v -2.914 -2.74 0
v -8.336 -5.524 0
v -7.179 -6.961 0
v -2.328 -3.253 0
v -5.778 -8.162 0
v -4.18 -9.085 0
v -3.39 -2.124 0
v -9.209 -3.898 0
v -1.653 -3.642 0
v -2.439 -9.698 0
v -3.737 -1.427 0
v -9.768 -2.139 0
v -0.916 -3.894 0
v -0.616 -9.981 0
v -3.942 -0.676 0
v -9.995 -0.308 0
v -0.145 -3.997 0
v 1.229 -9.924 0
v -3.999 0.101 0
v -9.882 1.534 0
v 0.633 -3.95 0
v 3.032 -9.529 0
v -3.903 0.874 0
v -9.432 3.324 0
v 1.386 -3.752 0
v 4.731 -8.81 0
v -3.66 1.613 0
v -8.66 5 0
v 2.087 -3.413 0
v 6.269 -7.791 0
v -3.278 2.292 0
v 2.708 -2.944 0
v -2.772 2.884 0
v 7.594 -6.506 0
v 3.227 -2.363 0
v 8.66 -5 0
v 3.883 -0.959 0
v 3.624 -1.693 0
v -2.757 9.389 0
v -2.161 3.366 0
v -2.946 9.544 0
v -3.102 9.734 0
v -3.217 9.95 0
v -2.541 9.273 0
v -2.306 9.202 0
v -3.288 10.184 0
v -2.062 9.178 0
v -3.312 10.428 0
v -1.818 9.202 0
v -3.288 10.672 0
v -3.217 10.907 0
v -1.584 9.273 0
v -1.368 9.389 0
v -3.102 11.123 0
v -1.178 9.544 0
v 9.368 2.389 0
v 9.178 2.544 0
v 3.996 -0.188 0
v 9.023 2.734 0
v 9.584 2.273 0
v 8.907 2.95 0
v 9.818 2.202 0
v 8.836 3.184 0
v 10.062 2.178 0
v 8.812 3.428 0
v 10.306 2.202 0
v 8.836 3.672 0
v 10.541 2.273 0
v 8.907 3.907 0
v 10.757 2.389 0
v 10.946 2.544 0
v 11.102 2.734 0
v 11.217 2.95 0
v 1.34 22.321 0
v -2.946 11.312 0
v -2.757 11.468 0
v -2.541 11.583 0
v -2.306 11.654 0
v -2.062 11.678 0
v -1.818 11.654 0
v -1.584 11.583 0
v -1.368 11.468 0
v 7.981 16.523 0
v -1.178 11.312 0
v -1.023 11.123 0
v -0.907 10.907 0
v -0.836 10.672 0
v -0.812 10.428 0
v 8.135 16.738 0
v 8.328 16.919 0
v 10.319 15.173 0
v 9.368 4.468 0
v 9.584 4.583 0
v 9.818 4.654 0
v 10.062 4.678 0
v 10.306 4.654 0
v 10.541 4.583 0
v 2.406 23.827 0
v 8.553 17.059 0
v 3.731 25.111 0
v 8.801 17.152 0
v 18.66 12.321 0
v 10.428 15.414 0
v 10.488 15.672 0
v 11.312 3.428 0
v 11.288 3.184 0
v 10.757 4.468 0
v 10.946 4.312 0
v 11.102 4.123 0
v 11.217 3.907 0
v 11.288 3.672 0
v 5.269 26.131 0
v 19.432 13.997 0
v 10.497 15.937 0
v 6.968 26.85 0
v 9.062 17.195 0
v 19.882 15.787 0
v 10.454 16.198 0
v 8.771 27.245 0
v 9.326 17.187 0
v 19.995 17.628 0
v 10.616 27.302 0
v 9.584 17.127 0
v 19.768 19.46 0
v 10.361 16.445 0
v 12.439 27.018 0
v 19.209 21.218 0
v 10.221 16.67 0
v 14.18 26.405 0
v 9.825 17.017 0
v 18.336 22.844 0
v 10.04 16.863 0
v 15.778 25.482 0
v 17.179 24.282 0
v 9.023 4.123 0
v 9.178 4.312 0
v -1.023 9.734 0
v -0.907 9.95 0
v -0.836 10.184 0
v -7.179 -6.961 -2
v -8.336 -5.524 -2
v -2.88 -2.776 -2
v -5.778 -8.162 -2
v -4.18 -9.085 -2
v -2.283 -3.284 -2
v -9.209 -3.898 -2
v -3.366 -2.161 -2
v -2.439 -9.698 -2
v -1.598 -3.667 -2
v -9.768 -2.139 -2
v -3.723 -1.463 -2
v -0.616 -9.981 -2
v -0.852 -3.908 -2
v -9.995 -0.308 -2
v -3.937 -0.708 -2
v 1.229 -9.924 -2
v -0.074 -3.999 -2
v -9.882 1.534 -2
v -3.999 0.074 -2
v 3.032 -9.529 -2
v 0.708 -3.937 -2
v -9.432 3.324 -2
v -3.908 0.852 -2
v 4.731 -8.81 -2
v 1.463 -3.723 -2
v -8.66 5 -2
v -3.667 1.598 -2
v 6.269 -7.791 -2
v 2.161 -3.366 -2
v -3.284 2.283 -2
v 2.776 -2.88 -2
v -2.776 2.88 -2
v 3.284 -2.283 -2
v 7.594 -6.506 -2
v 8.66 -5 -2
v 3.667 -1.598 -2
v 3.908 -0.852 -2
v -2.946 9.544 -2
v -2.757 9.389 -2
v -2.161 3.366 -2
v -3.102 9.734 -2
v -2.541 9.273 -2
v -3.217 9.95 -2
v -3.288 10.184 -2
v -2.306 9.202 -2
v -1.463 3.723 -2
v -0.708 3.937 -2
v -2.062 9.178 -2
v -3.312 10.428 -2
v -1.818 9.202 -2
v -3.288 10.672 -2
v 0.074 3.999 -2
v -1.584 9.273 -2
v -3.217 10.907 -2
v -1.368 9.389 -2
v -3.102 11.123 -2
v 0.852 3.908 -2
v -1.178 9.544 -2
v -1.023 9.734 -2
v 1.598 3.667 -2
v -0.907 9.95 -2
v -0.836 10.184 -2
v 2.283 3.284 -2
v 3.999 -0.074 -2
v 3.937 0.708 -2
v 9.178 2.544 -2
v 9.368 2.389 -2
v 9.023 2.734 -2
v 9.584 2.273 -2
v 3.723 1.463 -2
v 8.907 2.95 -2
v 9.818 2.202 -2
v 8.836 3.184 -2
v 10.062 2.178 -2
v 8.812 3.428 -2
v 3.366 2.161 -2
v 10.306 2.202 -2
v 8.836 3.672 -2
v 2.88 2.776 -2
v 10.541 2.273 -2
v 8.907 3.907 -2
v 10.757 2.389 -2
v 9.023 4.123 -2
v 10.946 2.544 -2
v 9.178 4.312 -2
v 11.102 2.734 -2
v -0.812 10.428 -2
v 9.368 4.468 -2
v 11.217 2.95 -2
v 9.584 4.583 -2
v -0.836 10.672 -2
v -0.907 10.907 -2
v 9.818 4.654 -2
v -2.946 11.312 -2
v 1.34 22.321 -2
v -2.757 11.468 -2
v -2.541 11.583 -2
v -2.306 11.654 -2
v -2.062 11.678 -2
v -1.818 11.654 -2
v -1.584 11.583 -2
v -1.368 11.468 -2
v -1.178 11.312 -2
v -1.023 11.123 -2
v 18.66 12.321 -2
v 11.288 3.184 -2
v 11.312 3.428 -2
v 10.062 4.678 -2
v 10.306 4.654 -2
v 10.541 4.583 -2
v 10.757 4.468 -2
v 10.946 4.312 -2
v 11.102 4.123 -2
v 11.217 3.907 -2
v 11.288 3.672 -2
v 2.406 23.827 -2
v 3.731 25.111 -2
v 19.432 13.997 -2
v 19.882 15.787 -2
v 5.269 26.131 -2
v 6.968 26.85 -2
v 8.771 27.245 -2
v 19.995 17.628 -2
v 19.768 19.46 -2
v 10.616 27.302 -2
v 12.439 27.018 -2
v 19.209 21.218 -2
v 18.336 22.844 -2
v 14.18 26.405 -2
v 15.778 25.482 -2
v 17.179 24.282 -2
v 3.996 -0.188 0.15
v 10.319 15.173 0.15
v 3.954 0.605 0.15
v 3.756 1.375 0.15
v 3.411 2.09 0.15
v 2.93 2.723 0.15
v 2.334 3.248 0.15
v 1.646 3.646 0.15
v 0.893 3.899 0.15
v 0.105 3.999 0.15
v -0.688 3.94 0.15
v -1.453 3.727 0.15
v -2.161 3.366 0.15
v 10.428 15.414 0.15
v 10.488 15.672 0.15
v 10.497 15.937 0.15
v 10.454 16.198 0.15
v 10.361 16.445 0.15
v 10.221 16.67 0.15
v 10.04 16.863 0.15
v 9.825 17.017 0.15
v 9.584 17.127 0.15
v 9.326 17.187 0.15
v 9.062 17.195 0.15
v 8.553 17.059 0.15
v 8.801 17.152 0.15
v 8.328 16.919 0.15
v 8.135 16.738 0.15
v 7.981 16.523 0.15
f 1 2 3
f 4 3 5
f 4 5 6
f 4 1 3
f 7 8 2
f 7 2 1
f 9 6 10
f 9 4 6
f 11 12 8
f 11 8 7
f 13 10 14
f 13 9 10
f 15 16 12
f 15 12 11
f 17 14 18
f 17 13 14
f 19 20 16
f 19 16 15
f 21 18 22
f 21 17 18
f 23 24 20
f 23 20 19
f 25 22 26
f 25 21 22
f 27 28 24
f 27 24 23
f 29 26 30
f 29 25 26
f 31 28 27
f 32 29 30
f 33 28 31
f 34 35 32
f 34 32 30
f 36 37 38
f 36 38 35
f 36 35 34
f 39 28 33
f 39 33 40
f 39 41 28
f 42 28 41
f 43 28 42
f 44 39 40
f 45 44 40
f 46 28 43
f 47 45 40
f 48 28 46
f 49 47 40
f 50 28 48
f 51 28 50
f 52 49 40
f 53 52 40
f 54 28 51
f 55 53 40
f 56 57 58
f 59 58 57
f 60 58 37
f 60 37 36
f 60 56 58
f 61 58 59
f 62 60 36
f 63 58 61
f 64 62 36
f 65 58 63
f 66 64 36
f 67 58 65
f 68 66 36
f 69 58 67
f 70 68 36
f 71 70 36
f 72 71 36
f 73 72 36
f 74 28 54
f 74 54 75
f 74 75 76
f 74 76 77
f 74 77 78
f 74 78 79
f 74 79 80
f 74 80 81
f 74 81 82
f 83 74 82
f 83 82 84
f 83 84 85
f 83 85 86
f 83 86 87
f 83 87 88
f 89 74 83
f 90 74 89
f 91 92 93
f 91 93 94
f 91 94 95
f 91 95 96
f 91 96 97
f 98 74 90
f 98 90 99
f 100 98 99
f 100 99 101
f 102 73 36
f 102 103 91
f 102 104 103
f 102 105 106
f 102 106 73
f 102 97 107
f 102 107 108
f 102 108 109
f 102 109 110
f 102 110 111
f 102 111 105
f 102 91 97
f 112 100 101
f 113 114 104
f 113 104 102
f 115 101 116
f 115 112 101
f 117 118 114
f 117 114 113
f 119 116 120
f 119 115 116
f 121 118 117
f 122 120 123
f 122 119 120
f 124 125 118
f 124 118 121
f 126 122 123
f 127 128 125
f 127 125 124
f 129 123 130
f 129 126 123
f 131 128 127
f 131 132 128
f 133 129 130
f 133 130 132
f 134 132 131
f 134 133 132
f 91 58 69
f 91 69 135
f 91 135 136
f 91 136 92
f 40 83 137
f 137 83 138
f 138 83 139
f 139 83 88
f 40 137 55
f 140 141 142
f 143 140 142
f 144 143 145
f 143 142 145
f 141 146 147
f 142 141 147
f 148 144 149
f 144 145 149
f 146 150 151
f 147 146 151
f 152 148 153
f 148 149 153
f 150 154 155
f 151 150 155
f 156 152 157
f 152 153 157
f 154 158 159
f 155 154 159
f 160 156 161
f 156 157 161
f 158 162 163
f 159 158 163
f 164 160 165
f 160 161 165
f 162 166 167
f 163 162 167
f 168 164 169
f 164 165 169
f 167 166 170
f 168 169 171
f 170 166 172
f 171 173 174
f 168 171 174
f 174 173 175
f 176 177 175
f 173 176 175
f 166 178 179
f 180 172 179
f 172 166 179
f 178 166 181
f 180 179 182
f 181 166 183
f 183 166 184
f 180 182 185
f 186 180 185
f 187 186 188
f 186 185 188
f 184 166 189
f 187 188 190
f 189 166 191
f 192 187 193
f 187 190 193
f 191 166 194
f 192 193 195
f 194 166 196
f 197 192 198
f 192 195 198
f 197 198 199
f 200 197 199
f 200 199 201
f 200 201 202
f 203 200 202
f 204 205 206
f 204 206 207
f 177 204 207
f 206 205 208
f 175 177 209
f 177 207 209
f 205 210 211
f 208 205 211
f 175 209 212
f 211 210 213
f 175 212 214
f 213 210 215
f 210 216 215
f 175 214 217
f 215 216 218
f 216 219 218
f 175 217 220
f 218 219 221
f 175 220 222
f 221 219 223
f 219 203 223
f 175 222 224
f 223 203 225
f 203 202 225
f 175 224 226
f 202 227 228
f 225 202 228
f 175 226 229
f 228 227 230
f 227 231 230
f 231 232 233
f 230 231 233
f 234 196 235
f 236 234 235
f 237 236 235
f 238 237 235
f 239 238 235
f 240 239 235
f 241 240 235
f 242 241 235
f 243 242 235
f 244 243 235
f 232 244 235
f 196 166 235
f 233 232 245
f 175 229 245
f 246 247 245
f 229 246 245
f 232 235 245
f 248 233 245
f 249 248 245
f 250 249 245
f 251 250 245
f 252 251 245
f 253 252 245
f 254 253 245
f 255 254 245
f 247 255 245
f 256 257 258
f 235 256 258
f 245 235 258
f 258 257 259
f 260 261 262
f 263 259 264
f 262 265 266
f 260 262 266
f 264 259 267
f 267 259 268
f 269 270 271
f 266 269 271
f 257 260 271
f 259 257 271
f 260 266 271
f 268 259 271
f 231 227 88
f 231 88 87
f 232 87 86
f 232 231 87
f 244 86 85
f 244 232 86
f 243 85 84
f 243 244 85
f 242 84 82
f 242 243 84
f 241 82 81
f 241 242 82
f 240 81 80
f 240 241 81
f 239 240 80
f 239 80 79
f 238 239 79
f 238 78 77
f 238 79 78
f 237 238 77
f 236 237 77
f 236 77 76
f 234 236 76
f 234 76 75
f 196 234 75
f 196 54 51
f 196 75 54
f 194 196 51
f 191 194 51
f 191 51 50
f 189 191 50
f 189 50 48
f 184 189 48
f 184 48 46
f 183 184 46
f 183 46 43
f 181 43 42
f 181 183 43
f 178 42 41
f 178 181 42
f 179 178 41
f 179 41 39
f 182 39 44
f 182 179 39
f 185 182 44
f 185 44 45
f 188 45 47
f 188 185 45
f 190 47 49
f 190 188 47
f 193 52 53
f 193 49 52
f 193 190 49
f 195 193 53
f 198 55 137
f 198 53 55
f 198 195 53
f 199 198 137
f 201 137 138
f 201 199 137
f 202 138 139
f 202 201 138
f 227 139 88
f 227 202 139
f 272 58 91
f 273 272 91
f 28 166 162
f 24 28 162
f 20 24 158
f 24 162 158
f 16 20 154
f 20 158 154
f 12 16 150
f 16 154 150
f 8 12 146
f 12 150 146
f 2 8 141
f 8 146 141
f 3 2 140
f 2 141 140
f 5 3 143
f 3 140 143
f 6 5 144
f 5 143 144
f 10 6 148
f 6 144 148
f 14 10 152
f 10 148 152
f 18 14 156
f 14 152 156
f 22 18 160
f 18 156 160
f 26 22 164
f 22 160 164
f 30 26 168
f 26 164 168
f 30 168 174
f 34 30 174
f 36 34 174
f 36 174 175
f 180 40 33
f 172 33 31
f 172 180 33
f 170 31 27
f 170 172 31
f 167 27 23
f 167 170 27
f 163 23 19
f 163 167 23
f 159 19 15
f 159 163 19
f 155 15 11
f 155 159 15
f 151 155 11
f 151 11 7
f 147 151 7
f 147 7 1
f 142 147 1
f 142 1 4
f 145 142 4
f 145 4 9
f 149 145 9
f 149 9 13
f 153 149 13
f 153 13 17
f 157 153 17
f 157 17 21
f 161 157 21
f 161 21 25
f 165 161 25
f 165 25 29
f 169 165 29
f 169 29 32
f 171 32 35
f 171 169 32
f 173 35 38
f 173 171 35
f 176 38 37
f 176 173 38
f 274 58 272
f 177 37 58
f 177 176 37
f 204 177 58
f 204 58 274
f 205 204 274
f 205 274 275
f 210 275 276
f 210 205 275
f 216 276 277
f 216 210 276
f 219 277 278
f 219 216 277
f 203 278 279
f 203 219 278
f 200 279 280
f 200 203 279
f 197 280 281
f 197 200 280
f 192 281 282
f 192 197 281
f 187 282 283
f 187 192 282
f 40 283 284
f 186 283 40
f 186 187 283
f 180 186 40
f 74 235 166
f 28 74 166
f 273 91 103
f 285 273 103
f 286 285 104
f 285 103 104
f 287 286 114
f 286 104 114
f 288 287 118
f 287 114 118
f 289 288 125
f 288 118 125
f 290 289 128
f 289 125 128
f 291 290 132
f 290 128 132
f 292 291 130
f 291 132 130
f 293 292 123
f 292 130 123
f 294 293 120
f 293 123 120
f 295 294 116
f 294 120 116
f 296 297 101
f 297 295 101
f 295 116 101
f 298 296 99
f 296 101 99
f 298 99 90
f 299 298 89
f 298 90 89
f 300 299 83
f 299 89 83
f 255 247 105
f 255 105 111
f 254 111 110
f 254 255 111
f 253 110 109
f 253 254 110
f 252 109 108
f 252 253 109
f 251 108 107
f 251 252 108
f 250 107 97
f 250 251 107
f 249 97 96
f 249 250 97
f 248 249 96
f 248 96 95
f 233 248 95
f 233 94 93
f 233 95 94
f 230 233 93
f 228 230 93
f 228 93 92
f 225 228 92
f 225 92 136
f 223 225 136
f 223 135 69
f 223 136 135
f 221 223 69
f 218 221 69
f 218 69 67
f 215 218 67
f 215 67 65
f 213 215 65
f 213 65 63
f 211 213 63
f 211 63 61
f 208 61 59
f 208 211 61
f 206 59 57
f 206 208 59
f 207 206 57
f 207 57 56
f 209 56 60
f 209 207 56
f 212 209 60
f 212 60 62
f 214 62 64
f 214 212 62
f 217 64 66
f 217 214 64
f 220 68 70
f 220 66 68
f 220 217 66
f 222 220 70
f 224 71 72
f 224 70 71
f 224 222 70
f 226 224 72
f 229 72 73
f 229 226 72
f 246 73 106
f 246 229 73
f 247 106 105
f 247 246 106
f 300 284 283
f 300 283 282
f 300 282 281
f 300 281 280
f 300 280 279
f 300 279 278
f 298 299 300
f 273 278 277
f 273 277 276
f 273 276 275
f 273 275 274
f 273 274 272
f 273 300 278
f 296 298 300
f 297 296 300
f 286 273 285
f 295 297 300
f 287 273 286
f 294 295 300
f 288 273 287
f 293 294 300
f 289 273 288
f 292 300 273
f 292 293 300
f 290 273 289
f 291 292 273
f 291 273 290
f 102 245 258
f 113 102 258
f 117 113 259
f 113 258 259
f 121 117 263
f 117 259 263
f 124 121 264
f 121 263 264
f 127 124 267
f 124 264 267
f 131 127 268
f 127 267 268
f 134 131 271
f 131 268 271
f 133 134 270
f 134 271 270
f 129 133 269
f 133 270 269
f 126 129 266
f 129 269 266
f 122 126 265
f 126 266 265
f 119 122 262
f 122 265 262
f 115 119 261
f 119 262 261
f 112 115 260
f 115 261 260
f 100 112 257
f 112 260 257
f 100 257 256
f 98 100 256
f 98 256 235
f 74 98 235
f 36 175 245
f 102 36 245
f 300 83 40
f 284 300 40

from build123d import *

# Parameters (mm, degrees)
RETAINER_PLATE_2MM_START         = -2
RETAINER_PLATE_2MM_DEPTH         = 2
RETAINER_PLATE_2MM_ROOT_START    = -2
SKETCH_2_R                       = 10
RETAINER_PLATE_2MM_ROOT_DEPTH    = 2
RETAINER_PLATE_2MM_TIP_START     = -2
SKETCH_3_R                       = 10
RETAINER_PLATE_2MM_TIP_DEPTH     = 2
HORN_CONTACT_PAD_0P15_DEPTH      = 0.15
SKETCH_5_R                       = 3.8
HORN_CONTACT_PAD_0P15_ROOT_DEPTH = 0.15
SKETCH_6_R                       = 1.35
HORN_CONTACT_PAD_0P15_TIP_DEPTH  = 0.15
BOSS_CLEARANCE_8_START           = -2.1
SKETCH_7_R                       = 4
BOSS_CLEARANCE_8_DEPTH           = 2.5
M2_CLEARANCE_2P5_PITCH14_START   = -2.1
SKETCH_8_R                       = 1.25
M2_CLEARANCE_2P5_PITCH14_DEPTH   = 2.5


with BuildPart() as part:
    # 草图1 → Retainer_plate_2mm (new body)
    with BuildSketch(Plane.XY.offset(RETAINER_PLATE_2MM_START)):
        Polygon((8.660254038, -5), (18.660254038, 12.320508076), (1.339745962, 22.320508076), (-8.660254038, 5), align=None)
    extrude(amount=RETAINER_PLATE_2MM_DEPTH)

    # 草图2 → Retainer_plate_2mm_root (add)
    with BuildSketch(Plane.XY.offset(RETAINER_PLATE_2MM_ROOT_START)):
        Circle(SKETCH_2_R)
    extrude(amount=RETAINER_PLATE_2MM_ROOT_DEPTH)

    # 草图3 → Retainer_plate_2mm_tip (add)
    with BuildSketch(Plane.XY.offset(RETAINER_PLATE_2MM_TIP_START)):
        with Locations((10, 17.320508076)):
            Circle(SKETCH_3_R)
    extrude(amount=RETAINER_PLATE_2MM_TIP_DEPTH)

    # 草图4 → Horn_contact_pad_0p15 (add)
    with BuildSketch(Plane.XY):
        Polygon((3.290896534, -1.9), (10.319134295, 15.173264889), (7.980865705, 16.523264889), (-3.290896534, 1.9), align=None)
    extrude(amount=HORN_CONTACT_PAD_0P15_DEPTH)

    # 草图5 → Horn_contact_pad_0p15_root (add)
    with BuildSketch(Plane.XY):
        Circle(SKETCH_5_R)
    extrude(amount=HORN_CONTACT_PAD_0P15_ROOT_DEPTH)

    # 草图6 → Horn_contact_pad_0p15_tip (add)
    with BuildSketch(Plane.XY):
        with Locations((9.15, 15.848264889)):
            Circle(SKETCH_6_R)
    extrude(amount=HORN_CONTACT_PAD_0P15_TIP_DEPTH)

    # 草图7 → Boss_clearance_8 (cut)
    with BuildSketch(Plane.XY.offset(BOSS_CLEARANCE_8_START)):
        with Locations(Location((0, 0, 0), (0, 0, 122.696435406))):
            Circle(SKETCH_7_R)
    extrude(amount=BOSS_CLEARANCE_8_DEPTH, mode=Mode.SUBTRACT)

    # 草图8 → M2_clearance_2p5_pitch14 (cut)
    with BuildSketch(Plane.XY.offset(M2_CLEARANCE_2P5_PITCH14_START)):
        with Locations((10.062177826, 3.42820323)):
            Circle(SKETCH_8_R)
        with Locations((-2.062177826, 10.42820323)):
            Circle(SKETCH_8_R)
    extrude(amount=M2_CLEARANCE_2P5_PITCH14_DEPTH, mode=Mode.SUBTRACT)


solid = part.part
